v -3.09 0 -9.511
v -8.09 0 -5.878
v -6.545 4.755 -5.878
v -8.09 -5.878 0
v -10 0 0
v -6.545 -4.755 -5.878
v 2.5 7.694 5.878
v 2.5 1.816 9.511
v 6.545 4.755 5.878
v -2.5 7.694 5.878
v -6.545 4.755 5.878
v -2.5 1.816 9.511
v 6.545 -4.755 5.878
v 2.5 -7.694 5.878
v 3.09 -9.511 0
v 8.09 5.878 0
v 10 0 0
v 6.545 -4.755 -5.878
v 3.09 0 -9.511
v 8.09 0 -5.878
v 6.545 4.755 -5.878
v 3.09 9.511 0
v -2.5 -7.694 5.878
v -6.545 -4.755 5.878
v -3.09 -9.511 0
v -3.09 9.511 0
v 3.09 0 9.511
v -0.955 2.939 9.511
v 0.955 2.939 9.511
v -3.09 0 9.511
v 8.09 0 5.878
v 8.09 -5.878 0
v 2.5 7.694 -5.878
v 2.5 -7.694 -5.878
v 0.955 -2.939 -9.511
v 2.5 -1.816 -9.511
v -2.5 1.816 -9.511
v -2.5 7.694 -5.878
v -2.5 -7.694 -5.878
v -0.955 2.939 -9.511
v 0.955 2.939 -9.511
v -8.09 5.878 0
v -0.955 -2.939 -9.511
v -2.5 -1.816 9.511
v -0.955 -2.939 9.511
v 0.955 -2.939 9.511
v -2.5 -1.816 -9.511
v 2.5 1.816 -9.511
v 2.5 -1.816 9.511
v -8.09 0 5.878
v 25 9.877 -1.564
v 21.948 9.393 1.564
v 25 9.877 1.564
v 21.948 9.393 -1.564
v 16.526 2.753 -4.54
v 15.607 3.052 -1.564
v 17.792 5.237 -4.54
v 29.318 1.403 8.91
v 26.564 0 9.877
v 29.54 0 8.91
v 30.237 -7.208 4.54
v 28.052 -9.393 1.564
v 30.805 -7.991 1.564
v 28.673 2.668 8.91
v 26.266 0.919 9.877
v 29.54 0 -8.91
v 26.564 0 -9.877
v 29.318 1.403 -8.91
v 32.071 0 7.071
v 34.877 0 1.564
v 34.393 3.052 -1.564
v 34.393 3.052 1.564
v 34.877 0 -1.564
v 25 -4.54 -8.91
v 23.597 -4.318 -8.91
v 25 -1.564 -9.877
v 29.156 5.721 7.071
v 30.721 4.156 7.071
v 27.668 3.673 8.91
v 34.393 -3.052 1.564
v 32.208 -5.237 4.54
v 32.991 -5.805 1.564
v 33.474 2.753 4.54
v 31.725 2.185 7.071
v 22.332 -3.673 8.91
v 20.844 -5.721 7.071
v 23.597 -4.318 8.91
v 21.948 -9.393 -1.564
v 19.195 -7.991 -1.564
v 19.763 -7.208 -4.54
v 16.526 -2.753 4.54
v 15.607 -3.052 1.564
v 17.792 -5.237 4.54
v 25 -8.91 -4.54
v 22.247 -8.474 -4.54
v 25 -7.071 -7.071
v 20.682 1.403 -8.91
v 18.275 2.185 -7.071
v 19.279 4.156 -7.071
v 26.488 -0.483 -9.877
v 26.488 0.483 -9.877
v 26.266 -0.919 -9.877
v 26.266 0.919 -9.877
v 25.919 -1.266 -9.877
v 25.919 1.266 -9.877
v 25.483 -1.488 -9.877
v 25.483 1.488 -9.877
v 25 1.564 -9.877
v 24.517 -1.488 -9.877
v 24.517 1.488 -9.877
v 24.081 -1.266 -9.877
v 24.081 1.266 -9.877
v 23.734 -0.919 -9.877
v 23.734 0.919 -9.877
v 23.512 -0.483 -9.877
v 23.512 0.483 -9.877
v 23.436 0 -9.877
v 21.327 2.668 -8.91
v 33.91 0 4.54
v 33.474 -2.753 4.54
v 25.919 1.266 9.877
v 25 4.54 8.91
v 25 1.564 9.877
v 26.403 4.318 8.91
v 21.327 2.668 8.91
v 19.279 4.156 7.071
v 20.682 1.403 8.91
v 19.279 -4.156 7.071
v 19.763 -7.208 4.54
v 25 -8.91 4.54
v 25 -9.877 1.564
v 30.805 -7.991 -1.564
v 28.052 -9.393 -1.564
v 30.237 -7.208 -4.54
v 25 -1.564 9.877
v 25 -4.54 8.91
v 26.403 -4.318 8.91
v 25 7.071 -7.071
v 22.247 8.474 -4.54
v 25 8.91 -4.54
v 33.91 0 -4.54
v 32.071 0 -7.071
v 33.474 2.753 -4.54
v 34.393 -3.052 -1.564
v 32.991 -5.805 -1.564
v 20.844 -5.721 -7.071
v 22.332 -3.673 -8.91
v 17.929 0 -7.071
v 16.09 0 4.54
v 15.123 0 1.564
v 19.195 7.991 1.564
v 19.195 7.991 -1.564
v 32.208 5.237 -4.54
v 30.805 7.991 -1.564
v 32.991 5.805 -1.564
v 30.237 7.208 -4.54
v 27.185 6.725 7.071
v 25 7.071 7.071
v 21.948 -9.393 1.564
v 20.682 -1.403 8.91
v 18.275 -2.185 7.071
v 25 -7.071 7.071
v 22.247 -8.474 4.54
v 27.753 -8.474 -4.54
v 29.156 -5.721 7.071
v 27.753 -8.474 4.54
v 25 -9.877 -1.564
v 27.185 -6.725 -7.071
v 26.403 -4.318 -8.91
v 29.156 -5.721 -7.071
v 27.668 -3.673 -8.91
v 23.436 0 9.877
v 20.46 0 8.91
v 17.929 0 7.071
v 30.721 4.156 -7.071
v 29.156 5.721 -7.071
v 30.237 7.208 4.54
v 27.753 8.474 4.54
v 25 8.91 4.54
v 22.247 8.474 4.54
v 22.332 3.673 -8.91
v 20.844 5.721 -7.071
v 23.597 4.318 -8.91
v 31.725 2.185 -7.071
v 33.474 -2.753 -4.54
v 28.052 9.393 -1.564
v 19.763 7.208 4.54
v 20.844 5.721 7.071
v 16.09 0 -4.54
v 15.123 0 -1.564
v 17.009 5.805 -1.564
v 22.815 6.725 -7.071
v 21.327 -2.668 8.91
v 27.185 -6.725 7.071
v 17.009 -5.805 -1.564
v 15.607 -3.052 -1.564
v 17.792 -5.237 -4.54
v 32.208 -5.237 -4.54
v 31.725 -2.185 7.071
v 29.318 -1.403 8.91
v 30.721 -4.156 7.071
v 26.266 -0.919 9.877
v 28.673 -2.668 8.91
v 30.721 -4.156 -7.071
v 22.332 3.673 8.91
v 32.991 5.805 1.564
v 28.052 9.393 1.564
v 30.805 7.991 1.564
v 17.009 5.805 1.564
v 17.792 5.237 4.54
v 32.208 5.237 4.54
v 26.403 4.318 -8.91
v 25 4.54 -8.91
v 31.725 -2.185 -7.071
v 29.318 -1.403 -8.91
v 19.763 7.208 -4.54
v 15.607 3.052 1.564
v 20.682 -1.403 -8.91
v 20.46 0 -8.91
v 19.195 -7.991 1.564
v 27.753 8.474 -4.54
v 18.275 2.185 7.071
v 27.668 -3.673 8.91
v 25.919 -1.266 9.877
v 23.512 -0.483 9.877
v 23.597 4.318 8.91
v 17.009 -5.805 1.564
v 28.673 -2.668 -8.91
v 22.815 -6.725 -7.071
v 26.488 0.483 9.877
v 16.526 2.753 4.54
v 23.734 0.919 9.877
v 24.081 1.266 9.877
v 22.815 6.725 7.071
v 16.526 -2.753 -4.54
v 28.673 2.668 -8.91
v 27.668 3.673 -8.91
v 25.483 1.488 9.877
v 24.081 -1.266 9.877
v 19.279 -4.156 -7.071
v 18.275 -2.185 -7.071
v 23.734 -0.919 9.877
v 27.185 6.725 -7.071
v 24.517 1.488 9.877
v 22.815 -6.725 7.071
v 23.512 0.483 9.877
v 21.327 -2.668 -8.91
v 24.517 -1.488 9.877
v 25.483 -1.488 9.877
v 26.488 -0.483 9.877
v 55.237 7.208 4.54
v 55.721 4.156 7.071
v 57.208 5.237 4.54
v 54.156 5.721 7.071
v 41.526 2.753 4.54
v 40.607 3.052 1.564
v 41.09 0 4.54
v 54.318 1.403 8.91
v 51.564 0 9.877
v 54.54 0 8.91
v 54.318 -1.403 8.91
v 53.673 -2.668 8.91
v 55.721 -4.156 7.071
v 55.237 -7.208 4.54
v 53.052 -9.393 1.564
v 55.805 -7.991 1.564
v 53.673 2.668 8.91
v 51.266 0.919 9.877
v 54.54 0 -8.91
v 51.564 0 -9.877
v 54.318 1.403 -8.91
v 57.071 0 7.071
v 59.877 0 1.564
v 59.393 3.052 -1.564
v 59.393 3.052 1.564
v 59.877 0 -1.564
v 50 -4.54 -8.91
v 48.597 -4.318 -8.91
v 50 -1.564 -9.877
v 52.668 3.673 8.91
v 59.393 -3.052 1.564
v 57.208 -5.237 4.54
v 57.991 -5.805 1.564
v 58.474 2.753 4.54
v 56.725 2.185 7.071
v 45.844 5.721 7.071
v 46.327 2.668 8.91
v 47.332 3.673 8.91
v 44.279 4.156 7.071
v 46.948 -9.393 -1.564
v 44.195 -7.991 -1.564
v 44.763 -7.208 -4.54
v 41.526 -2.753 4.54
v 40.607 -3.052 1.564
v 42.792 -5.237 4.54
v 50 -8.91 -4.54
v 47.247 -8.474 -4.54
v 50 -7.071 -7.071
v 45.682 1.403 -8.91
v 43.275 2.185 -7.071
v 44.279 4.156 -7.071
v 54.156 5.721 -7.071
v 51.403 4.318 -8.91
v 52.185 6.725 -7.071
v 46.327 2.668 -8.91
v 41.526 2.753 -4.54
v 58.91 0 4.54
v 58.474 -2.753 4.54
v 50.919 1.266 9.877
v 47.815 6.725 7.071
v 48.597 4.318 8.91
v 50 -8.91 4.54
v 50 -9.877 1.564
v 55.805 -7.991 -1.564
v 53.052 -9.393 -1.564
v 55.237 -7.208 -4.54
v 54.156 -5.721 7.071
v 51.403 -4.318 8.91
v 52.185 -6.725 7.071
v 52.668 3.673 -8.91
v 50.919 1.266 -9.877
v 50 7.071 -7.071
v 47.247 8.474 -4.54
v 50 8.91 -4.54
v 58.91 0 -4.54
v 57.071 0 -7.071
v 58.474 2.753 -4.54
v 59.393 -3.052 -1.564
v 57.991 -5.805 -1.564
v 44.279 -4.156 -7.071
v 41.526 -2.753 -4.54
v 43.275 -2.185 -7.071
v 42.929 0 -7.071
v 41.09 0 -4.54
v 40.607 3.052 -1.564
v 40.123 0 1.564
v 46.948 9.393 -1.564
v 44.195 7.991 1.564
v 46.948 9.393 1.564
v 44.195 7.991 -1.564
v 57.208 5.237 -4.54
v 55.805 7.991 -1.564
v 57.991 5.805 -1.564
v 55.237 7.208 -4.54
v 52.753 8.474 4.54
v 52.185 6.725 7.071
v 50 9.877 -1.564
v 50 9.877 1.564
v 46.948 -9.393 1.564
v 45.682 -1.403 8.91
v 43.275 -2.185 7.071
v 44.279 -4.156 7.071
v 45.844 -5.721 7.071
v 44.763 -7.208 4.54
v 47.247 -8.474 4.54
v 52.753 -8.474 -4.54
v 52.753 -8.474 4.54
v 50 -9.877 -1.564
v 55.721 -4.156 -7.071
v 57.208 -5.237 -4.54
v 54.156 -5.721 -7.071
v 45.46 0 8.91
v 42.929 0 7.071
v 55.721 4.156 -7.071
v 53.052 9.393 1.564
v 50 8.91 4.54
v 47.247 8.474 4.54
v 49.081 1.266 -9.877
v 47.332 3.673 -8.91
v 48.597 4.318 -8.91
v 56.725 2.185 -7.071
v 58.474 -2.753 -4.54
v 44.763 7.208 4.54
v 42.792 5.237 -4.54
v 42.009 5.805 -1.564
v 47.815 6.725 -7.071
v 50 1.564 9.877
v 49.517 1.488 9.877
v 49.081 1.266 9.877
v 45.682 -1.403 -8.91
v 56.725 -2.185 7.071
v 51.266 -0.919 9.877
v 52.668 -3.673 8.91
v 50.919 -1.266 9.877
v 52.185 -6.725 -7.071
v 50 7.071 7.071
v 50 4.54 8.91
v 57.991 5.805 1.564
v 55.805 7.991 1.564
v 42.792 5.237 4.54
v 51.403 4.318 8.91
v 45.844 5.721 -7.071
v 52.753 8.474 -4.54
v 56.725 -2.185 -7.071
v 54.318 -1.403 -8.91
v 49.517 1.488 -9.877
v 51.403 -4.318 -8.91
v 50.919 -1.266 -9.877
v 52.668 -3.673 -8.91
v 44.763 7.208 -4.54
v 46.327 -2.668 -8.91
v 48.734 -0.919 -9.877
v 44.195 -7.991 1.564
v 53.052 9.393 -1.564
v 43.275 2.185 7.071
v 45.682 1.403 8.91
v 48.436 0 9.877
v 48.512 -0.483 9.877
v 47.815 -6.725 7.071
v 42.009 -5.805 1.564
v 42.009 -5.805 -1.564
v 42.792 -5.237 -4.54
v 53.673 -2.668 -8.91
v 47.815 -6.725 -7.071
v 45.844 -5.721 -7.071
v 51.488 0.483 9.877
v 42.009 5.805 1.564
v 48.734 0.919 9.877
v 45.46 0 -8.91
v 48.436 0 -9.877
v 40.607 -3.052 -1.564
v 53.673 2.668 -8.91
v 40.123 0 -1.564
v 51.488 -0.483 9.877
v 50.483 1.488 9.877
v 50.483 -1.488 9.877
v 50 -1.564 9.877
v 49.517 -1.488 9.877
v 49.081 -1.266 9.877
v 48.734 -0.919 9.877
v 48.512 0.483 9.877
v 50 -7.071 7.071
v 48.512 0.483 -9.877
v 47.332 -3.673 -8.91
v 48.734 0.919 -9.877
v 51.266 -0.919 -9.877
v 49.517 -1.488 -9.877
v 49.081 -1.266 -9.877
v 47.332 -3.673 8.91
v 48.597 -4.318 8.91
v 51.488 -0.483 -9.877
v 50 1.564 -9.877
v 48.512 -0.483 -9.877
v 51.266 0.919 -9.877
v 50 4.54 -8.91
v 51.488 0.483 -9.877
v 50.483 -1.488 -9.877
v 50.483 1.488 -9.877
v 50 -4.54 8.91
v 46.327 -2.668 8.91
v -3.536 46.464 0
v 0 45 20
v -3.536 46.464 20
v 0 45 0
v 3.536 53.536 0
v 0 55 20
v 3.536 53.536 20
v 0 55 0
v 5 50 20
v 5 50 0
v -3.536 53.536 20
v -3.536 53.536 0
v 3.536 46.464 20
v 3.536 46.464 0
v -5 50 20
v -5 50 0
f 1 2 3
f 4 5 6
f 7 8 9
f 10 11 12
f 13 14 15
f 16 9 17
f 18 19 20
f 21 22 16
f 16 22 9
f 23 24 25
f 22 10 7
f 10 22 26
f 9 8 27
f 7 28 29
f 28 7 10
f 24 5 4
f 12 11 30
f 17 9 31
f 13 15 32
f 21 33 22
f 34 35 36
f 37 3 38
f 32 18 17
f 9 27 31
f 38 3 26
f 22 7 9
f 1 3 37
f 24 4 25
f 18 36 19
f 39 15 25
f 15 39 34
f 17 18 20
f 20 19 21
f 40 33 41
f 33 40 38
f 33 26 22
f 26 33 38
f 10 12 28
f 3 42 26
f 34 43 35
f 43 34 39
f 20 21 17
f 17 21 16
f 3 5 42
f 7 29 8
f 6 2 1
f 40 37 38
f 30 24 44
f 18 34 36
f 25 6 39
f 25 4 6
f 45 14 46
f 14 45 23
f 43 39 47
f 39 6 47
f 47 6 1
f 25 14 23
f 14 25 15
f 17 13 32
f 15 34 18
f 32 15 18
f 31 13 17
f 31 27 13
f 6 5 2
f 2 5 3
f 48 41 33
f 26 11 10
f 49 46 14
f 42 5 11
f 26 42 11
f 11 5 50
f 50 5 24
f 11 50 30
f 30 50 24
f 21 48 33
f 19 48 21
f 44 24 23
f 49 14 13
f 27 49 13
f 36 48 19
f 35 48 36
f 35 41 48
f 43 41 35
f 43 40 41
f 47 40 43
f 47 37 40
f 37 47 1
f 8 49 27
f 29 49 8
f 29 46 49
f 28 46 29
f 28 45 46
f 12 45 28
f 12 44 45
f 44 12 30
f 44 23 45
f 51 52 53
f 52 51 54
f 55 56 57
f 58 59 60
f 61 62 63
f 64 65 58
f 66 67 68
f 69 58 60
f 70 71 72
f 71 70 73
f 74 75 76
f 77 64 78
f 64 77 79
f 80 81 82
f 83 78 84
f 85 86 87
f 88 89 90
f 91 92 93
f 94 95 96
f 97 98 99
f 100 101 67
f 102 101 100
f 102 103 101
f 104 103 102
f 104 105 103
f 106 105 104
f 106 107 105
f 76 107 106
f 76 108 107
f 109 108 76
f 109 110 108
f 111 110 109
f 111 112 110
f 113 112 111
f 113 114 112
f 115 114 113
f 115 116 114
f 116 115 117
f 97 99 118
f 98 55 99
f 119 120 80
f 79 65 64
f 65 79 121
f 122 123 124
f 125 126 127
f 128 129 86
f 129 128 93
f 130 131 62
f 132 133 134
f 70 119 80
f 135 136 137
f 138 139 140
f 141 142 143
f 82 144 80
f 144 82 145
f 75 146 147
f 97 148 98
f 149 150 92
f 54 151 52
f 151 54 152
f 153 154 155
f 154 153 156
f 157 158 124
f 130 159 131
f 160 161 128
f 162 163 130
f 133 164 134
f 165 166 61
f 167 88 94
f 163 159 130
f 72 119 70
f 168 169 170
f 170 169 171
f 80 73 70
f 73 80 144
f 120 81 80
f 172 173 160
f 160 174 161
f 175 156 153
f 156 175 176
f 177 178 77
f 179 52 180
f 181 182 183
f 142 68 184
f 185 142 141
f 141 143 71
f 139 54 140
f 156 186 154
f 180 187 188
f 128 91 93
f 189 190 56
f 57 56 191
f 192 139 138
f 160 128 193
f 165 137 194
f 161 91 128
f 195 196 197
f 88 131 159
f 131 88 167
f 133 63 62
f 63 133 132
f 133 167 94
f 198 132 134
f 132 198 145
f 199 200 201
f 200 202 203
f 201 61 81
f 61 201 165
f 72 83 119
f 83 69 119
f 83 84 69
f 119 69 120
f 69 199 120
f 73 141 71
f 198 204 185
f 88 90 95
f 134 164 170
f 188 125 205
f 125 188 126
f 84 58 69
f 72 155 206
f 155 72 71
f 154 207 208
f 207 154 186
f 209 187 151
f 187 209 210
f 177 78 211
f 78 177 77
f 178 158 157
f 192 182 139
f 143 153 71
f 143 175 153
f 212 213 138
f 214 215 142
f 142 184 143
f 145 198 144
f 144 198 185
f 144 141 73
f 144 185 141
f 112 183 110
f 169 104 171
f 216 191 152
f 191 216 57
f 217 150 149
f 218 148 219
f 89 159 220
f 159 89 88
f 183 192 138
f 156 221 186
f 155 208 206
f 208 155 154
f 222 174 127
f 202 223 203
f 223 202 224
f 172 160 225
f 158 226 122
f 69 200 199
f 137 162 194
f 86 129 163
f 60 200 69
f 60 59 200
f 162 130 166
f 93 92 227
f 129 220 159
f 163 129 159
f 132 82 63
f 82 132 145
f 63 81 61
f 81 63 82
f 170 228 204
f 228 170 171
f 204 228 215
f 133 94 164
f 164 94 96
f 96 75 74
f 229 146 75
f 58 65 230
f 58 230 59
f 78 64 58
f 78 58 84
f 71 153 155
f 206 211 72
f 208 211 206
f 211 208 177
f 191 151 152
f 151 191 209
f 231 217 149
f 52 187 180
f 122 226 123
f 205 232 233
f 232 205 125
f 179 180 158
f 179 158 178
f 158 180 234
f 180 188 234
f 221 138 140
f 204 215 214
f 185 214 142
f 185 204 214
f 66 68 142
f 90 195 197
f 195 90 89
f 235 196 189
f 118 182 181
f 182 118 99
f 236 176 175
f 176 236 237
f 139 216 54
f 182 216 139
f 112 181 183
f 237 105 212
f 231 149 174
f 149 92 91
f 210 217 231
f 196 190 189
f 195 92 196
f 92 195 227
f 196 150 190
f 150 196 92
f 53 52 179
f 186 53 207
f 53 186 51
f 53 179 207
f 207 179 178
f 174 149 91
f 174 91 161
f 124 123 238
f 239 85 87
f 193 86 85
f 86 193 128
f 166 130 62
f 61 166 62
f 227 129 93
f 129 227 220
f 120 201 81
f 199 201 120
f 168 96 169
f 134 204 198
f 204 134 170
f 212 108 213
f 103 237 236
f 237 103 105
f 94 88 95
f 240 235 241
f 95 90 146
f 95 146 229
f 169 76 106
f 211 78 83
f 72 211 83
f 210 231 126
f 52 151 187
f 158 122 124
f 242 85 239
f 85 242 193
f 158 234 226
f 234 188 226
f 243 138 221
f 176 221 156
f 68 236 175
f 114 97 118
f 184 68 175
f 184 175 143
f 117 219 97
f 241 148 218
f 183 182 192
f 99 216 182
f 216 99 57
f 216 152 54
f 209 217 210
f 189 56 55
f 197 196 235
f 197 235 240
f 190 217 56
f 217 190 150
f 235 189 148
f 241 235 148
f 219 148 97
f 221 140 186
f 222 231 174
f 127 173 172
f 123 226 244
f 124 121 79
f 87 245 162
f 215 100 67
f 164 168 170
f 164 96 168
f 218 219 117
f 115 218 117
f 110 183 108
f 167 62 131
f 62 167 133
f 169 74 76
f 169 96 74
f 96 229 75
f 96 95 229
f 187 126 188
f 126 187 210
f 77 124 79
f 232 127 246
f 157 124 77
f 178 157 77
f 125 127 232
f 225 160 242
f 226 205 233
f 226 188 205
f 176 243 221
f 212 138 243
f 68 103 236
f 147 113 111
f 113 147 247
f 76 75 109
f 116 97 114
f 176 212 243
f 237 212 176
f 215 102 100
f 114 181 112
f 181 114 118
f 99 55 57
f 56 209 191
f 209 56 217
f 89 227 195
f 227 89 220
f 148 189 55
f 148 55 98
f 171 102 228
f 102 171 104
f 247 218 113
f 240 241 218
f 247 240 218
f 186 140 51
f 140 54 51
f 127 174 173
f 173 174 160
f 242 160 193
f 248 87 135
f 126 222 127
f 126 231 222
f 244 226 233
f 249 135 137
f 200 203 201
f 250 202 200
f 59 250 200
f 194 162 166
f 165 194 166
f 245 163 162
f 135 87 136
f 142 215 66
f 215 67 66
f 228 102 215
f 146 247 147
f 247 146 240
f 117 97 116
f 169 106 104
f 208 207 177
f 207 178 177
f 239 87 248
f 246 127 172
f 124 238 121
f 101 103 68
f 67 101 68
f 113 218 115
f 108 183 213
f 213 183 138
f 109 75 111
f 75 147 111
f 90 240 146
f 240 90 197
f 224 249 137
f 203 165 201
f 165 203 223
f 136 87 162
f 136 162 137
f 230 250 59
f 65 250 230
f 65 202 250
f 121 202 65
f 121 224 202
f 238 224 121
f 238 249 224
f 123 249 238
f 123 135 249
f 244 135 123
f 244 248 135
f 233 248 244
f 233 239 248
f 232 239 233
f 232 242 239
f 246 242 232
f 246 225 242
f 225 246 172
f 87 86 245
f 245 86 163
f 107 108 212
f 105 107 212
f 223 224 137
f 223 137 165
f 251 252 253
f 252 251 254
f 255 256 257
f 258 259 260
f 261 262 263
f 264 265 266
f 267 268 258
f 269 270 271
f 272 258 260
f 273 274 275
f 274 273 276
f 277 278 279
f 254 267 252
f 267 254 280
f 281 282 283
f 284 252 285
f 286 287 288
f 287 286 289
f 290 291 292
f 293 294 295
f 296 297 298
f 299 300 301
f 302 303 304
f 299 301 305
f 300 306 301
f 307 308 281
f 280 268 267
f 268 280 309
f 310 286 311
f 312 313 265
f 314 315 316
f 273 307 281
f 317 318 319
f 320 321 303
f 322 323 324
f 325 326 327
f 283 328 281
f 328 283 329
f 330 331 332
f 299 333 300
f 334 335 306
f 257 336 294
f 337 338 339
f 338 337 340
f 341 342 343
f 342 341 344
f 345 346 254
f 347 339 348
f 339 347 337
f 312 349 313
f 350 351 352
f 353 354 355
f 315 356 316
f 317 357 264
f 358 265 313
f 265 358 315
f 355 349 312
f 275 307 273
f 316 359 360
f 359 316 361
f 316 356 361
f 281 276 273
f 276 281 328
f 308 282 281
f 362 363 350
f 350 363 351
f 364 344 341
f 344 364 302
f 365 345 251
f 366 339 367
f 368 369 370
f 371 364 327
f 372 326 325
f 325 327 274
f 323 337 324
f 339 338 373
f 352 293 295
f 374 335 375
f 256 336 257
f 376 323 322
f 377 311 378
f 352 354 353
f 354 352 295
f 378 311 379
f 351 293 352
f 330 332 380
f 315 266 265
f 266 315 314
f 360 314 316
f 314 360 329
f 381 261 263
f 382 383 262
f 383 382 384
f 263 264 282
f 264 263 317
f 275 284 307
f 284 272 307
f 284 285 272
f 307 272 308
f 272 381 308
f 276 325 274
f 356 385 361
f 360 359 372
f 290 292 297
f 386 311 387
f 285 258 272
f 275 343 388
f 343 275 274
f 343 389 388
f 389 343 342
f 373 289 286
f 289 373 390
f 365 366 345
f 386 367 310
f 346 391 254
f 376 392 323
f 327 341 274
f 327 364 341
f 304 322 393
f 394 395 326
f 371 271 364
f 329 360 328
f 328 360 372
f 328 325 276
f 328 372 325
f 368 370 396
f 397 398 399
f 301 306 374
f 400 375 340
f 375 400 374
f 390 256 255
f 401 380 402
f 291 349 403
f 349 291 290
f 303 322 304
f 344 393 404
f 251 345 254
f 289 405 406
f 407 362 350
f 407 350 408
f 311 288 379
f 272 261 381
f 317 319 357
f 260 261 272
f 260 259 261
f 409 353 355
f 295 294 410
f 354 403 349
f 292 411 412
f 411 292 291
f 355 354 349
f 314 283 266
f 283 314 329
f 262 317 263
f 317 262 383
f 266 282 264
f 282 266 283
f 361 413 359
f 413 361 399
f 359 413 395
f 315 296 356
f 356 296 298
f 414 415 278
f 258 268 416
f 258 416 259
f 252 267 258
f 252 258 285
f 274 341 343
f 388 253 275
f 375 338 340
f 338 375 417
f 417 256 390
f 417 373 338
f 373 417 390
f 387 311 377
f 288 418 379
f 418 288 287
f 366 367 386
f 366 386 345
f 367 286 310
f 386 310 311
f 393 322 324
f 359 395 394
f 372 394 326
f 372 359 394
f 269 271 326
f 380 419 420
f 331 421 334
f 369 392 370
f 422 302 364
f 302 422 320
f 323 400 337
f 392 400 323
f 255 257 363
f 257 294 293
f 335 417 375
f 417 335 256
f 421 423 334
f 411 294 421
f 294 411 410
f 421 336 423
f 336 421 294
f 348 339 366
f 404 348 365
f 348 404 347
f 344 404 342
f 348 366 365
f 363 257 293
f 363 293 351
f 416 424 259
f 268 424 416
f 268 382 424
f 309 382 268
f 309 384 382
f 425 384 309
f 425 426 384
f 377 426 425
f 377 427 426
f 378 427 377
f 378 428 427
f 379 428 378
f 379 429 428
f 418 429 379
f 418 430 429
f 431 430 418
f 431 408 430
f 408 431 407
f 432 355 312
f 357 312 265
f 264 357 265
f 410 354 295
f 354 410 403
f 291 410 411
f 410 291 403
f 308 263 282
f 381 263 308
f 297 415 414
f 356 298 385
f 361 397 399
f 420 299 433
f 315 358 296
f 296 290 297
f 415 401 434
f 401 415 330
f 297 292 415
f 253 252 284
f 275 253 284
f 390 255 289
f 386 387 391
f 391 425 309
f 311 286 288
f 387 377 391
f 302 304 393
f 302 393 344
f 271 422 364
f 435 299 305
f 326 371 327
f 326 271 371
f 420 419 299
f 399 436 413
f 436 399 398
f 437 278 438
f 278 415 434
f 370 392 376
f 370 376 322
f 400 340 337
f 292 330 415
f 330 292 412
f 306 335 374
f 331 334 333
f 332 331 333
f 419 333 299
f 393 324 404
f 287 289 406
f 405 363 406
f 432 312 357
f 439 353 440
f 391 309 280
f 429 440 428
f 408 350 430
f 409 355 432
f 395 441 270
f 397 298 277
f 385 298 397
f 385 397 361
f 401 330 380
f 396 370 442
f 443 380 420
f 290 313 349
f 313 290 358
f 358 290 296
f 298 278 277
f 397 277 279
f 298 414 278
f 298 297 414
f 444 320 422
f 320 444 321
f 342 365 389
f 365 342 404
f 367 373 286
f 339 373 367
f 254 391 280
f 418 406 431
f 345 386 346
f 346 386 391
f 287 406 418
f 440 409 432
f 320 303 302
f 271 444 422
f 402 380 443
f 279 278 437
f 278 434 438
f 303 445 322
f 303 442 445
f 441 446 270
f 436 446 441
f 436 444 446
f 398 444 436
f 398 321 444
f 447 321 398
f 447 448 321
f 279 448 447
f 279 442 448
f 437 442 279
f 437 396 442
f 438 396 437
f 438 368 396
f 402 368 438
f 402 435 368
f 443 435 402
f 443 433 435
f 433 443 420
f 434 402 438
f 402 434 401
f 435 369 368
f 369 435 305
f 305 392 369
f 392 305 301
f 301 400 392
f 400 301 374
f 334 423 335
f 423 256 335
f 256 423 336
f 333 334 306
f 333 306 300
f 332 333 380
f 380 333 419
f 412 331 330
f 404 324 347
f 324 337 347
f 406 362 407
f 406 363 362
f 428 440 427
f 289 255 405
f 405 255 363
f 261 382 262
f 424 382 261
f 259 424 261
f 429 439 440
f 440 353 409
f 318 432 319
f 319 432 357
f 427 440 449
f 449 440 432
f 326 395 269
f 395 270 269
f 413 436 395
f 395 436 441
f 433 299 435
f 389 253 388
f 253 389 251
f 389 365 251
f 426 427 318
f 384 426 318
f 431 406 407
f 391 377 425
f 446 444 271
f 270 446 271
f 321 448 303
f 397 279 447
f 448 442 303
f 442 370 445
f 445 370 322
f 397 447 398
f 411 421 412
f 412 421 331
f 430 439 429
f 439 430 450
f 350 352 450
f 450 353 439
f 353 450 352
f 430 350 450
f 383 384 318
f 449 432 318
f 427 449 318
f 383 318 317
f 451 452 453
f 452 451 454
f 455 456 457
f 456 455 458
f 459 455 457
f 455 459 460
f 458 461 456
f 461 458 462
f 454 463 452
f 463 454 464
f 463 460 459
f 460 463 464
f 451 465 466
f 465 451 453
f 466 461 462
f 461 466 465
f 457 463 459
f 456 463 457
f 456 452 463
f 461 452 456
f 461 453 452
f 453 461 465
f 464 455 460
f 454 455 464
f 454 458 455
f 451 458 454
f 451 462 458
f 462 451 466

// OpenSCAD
// OpenSCAD Primitive Solids Compatibility Test
// This file tests the newly implemented features

// Test 1: Resolution with $fn
translate([0, 0, 0]) sphere(r=10, $fn=10);

// Test 2: Resolution with $fa and $fs
translate([25, 0, 0]) sphere(r=10, $fa=5, $fs=0.1);

// Test 3: Global resolution variables
$fn = 20;
translate([50, 0, 0]) sphere(r=10);

// Test 4: Square with center=false (default)
translate([0, 25, 0]) square(10, center=false);

// Test 5: Square with center=true
translate([25, 25, 0]) square(10, center=true);

// Test 6: Cylinder with resolution
translate([0, 50, 0]) cylinder(h=20, r=5, $fn=8);

// Test 7: Circle with resolution
translate([25, 50, 0]) circle(r=5, $fa=10, $fs=0.5);

// Test 8: Text with alignment parameters (parsed but not yet applied)
translate([0, 75, 0]) text("Test", size=10, halign="center", valign="center");
